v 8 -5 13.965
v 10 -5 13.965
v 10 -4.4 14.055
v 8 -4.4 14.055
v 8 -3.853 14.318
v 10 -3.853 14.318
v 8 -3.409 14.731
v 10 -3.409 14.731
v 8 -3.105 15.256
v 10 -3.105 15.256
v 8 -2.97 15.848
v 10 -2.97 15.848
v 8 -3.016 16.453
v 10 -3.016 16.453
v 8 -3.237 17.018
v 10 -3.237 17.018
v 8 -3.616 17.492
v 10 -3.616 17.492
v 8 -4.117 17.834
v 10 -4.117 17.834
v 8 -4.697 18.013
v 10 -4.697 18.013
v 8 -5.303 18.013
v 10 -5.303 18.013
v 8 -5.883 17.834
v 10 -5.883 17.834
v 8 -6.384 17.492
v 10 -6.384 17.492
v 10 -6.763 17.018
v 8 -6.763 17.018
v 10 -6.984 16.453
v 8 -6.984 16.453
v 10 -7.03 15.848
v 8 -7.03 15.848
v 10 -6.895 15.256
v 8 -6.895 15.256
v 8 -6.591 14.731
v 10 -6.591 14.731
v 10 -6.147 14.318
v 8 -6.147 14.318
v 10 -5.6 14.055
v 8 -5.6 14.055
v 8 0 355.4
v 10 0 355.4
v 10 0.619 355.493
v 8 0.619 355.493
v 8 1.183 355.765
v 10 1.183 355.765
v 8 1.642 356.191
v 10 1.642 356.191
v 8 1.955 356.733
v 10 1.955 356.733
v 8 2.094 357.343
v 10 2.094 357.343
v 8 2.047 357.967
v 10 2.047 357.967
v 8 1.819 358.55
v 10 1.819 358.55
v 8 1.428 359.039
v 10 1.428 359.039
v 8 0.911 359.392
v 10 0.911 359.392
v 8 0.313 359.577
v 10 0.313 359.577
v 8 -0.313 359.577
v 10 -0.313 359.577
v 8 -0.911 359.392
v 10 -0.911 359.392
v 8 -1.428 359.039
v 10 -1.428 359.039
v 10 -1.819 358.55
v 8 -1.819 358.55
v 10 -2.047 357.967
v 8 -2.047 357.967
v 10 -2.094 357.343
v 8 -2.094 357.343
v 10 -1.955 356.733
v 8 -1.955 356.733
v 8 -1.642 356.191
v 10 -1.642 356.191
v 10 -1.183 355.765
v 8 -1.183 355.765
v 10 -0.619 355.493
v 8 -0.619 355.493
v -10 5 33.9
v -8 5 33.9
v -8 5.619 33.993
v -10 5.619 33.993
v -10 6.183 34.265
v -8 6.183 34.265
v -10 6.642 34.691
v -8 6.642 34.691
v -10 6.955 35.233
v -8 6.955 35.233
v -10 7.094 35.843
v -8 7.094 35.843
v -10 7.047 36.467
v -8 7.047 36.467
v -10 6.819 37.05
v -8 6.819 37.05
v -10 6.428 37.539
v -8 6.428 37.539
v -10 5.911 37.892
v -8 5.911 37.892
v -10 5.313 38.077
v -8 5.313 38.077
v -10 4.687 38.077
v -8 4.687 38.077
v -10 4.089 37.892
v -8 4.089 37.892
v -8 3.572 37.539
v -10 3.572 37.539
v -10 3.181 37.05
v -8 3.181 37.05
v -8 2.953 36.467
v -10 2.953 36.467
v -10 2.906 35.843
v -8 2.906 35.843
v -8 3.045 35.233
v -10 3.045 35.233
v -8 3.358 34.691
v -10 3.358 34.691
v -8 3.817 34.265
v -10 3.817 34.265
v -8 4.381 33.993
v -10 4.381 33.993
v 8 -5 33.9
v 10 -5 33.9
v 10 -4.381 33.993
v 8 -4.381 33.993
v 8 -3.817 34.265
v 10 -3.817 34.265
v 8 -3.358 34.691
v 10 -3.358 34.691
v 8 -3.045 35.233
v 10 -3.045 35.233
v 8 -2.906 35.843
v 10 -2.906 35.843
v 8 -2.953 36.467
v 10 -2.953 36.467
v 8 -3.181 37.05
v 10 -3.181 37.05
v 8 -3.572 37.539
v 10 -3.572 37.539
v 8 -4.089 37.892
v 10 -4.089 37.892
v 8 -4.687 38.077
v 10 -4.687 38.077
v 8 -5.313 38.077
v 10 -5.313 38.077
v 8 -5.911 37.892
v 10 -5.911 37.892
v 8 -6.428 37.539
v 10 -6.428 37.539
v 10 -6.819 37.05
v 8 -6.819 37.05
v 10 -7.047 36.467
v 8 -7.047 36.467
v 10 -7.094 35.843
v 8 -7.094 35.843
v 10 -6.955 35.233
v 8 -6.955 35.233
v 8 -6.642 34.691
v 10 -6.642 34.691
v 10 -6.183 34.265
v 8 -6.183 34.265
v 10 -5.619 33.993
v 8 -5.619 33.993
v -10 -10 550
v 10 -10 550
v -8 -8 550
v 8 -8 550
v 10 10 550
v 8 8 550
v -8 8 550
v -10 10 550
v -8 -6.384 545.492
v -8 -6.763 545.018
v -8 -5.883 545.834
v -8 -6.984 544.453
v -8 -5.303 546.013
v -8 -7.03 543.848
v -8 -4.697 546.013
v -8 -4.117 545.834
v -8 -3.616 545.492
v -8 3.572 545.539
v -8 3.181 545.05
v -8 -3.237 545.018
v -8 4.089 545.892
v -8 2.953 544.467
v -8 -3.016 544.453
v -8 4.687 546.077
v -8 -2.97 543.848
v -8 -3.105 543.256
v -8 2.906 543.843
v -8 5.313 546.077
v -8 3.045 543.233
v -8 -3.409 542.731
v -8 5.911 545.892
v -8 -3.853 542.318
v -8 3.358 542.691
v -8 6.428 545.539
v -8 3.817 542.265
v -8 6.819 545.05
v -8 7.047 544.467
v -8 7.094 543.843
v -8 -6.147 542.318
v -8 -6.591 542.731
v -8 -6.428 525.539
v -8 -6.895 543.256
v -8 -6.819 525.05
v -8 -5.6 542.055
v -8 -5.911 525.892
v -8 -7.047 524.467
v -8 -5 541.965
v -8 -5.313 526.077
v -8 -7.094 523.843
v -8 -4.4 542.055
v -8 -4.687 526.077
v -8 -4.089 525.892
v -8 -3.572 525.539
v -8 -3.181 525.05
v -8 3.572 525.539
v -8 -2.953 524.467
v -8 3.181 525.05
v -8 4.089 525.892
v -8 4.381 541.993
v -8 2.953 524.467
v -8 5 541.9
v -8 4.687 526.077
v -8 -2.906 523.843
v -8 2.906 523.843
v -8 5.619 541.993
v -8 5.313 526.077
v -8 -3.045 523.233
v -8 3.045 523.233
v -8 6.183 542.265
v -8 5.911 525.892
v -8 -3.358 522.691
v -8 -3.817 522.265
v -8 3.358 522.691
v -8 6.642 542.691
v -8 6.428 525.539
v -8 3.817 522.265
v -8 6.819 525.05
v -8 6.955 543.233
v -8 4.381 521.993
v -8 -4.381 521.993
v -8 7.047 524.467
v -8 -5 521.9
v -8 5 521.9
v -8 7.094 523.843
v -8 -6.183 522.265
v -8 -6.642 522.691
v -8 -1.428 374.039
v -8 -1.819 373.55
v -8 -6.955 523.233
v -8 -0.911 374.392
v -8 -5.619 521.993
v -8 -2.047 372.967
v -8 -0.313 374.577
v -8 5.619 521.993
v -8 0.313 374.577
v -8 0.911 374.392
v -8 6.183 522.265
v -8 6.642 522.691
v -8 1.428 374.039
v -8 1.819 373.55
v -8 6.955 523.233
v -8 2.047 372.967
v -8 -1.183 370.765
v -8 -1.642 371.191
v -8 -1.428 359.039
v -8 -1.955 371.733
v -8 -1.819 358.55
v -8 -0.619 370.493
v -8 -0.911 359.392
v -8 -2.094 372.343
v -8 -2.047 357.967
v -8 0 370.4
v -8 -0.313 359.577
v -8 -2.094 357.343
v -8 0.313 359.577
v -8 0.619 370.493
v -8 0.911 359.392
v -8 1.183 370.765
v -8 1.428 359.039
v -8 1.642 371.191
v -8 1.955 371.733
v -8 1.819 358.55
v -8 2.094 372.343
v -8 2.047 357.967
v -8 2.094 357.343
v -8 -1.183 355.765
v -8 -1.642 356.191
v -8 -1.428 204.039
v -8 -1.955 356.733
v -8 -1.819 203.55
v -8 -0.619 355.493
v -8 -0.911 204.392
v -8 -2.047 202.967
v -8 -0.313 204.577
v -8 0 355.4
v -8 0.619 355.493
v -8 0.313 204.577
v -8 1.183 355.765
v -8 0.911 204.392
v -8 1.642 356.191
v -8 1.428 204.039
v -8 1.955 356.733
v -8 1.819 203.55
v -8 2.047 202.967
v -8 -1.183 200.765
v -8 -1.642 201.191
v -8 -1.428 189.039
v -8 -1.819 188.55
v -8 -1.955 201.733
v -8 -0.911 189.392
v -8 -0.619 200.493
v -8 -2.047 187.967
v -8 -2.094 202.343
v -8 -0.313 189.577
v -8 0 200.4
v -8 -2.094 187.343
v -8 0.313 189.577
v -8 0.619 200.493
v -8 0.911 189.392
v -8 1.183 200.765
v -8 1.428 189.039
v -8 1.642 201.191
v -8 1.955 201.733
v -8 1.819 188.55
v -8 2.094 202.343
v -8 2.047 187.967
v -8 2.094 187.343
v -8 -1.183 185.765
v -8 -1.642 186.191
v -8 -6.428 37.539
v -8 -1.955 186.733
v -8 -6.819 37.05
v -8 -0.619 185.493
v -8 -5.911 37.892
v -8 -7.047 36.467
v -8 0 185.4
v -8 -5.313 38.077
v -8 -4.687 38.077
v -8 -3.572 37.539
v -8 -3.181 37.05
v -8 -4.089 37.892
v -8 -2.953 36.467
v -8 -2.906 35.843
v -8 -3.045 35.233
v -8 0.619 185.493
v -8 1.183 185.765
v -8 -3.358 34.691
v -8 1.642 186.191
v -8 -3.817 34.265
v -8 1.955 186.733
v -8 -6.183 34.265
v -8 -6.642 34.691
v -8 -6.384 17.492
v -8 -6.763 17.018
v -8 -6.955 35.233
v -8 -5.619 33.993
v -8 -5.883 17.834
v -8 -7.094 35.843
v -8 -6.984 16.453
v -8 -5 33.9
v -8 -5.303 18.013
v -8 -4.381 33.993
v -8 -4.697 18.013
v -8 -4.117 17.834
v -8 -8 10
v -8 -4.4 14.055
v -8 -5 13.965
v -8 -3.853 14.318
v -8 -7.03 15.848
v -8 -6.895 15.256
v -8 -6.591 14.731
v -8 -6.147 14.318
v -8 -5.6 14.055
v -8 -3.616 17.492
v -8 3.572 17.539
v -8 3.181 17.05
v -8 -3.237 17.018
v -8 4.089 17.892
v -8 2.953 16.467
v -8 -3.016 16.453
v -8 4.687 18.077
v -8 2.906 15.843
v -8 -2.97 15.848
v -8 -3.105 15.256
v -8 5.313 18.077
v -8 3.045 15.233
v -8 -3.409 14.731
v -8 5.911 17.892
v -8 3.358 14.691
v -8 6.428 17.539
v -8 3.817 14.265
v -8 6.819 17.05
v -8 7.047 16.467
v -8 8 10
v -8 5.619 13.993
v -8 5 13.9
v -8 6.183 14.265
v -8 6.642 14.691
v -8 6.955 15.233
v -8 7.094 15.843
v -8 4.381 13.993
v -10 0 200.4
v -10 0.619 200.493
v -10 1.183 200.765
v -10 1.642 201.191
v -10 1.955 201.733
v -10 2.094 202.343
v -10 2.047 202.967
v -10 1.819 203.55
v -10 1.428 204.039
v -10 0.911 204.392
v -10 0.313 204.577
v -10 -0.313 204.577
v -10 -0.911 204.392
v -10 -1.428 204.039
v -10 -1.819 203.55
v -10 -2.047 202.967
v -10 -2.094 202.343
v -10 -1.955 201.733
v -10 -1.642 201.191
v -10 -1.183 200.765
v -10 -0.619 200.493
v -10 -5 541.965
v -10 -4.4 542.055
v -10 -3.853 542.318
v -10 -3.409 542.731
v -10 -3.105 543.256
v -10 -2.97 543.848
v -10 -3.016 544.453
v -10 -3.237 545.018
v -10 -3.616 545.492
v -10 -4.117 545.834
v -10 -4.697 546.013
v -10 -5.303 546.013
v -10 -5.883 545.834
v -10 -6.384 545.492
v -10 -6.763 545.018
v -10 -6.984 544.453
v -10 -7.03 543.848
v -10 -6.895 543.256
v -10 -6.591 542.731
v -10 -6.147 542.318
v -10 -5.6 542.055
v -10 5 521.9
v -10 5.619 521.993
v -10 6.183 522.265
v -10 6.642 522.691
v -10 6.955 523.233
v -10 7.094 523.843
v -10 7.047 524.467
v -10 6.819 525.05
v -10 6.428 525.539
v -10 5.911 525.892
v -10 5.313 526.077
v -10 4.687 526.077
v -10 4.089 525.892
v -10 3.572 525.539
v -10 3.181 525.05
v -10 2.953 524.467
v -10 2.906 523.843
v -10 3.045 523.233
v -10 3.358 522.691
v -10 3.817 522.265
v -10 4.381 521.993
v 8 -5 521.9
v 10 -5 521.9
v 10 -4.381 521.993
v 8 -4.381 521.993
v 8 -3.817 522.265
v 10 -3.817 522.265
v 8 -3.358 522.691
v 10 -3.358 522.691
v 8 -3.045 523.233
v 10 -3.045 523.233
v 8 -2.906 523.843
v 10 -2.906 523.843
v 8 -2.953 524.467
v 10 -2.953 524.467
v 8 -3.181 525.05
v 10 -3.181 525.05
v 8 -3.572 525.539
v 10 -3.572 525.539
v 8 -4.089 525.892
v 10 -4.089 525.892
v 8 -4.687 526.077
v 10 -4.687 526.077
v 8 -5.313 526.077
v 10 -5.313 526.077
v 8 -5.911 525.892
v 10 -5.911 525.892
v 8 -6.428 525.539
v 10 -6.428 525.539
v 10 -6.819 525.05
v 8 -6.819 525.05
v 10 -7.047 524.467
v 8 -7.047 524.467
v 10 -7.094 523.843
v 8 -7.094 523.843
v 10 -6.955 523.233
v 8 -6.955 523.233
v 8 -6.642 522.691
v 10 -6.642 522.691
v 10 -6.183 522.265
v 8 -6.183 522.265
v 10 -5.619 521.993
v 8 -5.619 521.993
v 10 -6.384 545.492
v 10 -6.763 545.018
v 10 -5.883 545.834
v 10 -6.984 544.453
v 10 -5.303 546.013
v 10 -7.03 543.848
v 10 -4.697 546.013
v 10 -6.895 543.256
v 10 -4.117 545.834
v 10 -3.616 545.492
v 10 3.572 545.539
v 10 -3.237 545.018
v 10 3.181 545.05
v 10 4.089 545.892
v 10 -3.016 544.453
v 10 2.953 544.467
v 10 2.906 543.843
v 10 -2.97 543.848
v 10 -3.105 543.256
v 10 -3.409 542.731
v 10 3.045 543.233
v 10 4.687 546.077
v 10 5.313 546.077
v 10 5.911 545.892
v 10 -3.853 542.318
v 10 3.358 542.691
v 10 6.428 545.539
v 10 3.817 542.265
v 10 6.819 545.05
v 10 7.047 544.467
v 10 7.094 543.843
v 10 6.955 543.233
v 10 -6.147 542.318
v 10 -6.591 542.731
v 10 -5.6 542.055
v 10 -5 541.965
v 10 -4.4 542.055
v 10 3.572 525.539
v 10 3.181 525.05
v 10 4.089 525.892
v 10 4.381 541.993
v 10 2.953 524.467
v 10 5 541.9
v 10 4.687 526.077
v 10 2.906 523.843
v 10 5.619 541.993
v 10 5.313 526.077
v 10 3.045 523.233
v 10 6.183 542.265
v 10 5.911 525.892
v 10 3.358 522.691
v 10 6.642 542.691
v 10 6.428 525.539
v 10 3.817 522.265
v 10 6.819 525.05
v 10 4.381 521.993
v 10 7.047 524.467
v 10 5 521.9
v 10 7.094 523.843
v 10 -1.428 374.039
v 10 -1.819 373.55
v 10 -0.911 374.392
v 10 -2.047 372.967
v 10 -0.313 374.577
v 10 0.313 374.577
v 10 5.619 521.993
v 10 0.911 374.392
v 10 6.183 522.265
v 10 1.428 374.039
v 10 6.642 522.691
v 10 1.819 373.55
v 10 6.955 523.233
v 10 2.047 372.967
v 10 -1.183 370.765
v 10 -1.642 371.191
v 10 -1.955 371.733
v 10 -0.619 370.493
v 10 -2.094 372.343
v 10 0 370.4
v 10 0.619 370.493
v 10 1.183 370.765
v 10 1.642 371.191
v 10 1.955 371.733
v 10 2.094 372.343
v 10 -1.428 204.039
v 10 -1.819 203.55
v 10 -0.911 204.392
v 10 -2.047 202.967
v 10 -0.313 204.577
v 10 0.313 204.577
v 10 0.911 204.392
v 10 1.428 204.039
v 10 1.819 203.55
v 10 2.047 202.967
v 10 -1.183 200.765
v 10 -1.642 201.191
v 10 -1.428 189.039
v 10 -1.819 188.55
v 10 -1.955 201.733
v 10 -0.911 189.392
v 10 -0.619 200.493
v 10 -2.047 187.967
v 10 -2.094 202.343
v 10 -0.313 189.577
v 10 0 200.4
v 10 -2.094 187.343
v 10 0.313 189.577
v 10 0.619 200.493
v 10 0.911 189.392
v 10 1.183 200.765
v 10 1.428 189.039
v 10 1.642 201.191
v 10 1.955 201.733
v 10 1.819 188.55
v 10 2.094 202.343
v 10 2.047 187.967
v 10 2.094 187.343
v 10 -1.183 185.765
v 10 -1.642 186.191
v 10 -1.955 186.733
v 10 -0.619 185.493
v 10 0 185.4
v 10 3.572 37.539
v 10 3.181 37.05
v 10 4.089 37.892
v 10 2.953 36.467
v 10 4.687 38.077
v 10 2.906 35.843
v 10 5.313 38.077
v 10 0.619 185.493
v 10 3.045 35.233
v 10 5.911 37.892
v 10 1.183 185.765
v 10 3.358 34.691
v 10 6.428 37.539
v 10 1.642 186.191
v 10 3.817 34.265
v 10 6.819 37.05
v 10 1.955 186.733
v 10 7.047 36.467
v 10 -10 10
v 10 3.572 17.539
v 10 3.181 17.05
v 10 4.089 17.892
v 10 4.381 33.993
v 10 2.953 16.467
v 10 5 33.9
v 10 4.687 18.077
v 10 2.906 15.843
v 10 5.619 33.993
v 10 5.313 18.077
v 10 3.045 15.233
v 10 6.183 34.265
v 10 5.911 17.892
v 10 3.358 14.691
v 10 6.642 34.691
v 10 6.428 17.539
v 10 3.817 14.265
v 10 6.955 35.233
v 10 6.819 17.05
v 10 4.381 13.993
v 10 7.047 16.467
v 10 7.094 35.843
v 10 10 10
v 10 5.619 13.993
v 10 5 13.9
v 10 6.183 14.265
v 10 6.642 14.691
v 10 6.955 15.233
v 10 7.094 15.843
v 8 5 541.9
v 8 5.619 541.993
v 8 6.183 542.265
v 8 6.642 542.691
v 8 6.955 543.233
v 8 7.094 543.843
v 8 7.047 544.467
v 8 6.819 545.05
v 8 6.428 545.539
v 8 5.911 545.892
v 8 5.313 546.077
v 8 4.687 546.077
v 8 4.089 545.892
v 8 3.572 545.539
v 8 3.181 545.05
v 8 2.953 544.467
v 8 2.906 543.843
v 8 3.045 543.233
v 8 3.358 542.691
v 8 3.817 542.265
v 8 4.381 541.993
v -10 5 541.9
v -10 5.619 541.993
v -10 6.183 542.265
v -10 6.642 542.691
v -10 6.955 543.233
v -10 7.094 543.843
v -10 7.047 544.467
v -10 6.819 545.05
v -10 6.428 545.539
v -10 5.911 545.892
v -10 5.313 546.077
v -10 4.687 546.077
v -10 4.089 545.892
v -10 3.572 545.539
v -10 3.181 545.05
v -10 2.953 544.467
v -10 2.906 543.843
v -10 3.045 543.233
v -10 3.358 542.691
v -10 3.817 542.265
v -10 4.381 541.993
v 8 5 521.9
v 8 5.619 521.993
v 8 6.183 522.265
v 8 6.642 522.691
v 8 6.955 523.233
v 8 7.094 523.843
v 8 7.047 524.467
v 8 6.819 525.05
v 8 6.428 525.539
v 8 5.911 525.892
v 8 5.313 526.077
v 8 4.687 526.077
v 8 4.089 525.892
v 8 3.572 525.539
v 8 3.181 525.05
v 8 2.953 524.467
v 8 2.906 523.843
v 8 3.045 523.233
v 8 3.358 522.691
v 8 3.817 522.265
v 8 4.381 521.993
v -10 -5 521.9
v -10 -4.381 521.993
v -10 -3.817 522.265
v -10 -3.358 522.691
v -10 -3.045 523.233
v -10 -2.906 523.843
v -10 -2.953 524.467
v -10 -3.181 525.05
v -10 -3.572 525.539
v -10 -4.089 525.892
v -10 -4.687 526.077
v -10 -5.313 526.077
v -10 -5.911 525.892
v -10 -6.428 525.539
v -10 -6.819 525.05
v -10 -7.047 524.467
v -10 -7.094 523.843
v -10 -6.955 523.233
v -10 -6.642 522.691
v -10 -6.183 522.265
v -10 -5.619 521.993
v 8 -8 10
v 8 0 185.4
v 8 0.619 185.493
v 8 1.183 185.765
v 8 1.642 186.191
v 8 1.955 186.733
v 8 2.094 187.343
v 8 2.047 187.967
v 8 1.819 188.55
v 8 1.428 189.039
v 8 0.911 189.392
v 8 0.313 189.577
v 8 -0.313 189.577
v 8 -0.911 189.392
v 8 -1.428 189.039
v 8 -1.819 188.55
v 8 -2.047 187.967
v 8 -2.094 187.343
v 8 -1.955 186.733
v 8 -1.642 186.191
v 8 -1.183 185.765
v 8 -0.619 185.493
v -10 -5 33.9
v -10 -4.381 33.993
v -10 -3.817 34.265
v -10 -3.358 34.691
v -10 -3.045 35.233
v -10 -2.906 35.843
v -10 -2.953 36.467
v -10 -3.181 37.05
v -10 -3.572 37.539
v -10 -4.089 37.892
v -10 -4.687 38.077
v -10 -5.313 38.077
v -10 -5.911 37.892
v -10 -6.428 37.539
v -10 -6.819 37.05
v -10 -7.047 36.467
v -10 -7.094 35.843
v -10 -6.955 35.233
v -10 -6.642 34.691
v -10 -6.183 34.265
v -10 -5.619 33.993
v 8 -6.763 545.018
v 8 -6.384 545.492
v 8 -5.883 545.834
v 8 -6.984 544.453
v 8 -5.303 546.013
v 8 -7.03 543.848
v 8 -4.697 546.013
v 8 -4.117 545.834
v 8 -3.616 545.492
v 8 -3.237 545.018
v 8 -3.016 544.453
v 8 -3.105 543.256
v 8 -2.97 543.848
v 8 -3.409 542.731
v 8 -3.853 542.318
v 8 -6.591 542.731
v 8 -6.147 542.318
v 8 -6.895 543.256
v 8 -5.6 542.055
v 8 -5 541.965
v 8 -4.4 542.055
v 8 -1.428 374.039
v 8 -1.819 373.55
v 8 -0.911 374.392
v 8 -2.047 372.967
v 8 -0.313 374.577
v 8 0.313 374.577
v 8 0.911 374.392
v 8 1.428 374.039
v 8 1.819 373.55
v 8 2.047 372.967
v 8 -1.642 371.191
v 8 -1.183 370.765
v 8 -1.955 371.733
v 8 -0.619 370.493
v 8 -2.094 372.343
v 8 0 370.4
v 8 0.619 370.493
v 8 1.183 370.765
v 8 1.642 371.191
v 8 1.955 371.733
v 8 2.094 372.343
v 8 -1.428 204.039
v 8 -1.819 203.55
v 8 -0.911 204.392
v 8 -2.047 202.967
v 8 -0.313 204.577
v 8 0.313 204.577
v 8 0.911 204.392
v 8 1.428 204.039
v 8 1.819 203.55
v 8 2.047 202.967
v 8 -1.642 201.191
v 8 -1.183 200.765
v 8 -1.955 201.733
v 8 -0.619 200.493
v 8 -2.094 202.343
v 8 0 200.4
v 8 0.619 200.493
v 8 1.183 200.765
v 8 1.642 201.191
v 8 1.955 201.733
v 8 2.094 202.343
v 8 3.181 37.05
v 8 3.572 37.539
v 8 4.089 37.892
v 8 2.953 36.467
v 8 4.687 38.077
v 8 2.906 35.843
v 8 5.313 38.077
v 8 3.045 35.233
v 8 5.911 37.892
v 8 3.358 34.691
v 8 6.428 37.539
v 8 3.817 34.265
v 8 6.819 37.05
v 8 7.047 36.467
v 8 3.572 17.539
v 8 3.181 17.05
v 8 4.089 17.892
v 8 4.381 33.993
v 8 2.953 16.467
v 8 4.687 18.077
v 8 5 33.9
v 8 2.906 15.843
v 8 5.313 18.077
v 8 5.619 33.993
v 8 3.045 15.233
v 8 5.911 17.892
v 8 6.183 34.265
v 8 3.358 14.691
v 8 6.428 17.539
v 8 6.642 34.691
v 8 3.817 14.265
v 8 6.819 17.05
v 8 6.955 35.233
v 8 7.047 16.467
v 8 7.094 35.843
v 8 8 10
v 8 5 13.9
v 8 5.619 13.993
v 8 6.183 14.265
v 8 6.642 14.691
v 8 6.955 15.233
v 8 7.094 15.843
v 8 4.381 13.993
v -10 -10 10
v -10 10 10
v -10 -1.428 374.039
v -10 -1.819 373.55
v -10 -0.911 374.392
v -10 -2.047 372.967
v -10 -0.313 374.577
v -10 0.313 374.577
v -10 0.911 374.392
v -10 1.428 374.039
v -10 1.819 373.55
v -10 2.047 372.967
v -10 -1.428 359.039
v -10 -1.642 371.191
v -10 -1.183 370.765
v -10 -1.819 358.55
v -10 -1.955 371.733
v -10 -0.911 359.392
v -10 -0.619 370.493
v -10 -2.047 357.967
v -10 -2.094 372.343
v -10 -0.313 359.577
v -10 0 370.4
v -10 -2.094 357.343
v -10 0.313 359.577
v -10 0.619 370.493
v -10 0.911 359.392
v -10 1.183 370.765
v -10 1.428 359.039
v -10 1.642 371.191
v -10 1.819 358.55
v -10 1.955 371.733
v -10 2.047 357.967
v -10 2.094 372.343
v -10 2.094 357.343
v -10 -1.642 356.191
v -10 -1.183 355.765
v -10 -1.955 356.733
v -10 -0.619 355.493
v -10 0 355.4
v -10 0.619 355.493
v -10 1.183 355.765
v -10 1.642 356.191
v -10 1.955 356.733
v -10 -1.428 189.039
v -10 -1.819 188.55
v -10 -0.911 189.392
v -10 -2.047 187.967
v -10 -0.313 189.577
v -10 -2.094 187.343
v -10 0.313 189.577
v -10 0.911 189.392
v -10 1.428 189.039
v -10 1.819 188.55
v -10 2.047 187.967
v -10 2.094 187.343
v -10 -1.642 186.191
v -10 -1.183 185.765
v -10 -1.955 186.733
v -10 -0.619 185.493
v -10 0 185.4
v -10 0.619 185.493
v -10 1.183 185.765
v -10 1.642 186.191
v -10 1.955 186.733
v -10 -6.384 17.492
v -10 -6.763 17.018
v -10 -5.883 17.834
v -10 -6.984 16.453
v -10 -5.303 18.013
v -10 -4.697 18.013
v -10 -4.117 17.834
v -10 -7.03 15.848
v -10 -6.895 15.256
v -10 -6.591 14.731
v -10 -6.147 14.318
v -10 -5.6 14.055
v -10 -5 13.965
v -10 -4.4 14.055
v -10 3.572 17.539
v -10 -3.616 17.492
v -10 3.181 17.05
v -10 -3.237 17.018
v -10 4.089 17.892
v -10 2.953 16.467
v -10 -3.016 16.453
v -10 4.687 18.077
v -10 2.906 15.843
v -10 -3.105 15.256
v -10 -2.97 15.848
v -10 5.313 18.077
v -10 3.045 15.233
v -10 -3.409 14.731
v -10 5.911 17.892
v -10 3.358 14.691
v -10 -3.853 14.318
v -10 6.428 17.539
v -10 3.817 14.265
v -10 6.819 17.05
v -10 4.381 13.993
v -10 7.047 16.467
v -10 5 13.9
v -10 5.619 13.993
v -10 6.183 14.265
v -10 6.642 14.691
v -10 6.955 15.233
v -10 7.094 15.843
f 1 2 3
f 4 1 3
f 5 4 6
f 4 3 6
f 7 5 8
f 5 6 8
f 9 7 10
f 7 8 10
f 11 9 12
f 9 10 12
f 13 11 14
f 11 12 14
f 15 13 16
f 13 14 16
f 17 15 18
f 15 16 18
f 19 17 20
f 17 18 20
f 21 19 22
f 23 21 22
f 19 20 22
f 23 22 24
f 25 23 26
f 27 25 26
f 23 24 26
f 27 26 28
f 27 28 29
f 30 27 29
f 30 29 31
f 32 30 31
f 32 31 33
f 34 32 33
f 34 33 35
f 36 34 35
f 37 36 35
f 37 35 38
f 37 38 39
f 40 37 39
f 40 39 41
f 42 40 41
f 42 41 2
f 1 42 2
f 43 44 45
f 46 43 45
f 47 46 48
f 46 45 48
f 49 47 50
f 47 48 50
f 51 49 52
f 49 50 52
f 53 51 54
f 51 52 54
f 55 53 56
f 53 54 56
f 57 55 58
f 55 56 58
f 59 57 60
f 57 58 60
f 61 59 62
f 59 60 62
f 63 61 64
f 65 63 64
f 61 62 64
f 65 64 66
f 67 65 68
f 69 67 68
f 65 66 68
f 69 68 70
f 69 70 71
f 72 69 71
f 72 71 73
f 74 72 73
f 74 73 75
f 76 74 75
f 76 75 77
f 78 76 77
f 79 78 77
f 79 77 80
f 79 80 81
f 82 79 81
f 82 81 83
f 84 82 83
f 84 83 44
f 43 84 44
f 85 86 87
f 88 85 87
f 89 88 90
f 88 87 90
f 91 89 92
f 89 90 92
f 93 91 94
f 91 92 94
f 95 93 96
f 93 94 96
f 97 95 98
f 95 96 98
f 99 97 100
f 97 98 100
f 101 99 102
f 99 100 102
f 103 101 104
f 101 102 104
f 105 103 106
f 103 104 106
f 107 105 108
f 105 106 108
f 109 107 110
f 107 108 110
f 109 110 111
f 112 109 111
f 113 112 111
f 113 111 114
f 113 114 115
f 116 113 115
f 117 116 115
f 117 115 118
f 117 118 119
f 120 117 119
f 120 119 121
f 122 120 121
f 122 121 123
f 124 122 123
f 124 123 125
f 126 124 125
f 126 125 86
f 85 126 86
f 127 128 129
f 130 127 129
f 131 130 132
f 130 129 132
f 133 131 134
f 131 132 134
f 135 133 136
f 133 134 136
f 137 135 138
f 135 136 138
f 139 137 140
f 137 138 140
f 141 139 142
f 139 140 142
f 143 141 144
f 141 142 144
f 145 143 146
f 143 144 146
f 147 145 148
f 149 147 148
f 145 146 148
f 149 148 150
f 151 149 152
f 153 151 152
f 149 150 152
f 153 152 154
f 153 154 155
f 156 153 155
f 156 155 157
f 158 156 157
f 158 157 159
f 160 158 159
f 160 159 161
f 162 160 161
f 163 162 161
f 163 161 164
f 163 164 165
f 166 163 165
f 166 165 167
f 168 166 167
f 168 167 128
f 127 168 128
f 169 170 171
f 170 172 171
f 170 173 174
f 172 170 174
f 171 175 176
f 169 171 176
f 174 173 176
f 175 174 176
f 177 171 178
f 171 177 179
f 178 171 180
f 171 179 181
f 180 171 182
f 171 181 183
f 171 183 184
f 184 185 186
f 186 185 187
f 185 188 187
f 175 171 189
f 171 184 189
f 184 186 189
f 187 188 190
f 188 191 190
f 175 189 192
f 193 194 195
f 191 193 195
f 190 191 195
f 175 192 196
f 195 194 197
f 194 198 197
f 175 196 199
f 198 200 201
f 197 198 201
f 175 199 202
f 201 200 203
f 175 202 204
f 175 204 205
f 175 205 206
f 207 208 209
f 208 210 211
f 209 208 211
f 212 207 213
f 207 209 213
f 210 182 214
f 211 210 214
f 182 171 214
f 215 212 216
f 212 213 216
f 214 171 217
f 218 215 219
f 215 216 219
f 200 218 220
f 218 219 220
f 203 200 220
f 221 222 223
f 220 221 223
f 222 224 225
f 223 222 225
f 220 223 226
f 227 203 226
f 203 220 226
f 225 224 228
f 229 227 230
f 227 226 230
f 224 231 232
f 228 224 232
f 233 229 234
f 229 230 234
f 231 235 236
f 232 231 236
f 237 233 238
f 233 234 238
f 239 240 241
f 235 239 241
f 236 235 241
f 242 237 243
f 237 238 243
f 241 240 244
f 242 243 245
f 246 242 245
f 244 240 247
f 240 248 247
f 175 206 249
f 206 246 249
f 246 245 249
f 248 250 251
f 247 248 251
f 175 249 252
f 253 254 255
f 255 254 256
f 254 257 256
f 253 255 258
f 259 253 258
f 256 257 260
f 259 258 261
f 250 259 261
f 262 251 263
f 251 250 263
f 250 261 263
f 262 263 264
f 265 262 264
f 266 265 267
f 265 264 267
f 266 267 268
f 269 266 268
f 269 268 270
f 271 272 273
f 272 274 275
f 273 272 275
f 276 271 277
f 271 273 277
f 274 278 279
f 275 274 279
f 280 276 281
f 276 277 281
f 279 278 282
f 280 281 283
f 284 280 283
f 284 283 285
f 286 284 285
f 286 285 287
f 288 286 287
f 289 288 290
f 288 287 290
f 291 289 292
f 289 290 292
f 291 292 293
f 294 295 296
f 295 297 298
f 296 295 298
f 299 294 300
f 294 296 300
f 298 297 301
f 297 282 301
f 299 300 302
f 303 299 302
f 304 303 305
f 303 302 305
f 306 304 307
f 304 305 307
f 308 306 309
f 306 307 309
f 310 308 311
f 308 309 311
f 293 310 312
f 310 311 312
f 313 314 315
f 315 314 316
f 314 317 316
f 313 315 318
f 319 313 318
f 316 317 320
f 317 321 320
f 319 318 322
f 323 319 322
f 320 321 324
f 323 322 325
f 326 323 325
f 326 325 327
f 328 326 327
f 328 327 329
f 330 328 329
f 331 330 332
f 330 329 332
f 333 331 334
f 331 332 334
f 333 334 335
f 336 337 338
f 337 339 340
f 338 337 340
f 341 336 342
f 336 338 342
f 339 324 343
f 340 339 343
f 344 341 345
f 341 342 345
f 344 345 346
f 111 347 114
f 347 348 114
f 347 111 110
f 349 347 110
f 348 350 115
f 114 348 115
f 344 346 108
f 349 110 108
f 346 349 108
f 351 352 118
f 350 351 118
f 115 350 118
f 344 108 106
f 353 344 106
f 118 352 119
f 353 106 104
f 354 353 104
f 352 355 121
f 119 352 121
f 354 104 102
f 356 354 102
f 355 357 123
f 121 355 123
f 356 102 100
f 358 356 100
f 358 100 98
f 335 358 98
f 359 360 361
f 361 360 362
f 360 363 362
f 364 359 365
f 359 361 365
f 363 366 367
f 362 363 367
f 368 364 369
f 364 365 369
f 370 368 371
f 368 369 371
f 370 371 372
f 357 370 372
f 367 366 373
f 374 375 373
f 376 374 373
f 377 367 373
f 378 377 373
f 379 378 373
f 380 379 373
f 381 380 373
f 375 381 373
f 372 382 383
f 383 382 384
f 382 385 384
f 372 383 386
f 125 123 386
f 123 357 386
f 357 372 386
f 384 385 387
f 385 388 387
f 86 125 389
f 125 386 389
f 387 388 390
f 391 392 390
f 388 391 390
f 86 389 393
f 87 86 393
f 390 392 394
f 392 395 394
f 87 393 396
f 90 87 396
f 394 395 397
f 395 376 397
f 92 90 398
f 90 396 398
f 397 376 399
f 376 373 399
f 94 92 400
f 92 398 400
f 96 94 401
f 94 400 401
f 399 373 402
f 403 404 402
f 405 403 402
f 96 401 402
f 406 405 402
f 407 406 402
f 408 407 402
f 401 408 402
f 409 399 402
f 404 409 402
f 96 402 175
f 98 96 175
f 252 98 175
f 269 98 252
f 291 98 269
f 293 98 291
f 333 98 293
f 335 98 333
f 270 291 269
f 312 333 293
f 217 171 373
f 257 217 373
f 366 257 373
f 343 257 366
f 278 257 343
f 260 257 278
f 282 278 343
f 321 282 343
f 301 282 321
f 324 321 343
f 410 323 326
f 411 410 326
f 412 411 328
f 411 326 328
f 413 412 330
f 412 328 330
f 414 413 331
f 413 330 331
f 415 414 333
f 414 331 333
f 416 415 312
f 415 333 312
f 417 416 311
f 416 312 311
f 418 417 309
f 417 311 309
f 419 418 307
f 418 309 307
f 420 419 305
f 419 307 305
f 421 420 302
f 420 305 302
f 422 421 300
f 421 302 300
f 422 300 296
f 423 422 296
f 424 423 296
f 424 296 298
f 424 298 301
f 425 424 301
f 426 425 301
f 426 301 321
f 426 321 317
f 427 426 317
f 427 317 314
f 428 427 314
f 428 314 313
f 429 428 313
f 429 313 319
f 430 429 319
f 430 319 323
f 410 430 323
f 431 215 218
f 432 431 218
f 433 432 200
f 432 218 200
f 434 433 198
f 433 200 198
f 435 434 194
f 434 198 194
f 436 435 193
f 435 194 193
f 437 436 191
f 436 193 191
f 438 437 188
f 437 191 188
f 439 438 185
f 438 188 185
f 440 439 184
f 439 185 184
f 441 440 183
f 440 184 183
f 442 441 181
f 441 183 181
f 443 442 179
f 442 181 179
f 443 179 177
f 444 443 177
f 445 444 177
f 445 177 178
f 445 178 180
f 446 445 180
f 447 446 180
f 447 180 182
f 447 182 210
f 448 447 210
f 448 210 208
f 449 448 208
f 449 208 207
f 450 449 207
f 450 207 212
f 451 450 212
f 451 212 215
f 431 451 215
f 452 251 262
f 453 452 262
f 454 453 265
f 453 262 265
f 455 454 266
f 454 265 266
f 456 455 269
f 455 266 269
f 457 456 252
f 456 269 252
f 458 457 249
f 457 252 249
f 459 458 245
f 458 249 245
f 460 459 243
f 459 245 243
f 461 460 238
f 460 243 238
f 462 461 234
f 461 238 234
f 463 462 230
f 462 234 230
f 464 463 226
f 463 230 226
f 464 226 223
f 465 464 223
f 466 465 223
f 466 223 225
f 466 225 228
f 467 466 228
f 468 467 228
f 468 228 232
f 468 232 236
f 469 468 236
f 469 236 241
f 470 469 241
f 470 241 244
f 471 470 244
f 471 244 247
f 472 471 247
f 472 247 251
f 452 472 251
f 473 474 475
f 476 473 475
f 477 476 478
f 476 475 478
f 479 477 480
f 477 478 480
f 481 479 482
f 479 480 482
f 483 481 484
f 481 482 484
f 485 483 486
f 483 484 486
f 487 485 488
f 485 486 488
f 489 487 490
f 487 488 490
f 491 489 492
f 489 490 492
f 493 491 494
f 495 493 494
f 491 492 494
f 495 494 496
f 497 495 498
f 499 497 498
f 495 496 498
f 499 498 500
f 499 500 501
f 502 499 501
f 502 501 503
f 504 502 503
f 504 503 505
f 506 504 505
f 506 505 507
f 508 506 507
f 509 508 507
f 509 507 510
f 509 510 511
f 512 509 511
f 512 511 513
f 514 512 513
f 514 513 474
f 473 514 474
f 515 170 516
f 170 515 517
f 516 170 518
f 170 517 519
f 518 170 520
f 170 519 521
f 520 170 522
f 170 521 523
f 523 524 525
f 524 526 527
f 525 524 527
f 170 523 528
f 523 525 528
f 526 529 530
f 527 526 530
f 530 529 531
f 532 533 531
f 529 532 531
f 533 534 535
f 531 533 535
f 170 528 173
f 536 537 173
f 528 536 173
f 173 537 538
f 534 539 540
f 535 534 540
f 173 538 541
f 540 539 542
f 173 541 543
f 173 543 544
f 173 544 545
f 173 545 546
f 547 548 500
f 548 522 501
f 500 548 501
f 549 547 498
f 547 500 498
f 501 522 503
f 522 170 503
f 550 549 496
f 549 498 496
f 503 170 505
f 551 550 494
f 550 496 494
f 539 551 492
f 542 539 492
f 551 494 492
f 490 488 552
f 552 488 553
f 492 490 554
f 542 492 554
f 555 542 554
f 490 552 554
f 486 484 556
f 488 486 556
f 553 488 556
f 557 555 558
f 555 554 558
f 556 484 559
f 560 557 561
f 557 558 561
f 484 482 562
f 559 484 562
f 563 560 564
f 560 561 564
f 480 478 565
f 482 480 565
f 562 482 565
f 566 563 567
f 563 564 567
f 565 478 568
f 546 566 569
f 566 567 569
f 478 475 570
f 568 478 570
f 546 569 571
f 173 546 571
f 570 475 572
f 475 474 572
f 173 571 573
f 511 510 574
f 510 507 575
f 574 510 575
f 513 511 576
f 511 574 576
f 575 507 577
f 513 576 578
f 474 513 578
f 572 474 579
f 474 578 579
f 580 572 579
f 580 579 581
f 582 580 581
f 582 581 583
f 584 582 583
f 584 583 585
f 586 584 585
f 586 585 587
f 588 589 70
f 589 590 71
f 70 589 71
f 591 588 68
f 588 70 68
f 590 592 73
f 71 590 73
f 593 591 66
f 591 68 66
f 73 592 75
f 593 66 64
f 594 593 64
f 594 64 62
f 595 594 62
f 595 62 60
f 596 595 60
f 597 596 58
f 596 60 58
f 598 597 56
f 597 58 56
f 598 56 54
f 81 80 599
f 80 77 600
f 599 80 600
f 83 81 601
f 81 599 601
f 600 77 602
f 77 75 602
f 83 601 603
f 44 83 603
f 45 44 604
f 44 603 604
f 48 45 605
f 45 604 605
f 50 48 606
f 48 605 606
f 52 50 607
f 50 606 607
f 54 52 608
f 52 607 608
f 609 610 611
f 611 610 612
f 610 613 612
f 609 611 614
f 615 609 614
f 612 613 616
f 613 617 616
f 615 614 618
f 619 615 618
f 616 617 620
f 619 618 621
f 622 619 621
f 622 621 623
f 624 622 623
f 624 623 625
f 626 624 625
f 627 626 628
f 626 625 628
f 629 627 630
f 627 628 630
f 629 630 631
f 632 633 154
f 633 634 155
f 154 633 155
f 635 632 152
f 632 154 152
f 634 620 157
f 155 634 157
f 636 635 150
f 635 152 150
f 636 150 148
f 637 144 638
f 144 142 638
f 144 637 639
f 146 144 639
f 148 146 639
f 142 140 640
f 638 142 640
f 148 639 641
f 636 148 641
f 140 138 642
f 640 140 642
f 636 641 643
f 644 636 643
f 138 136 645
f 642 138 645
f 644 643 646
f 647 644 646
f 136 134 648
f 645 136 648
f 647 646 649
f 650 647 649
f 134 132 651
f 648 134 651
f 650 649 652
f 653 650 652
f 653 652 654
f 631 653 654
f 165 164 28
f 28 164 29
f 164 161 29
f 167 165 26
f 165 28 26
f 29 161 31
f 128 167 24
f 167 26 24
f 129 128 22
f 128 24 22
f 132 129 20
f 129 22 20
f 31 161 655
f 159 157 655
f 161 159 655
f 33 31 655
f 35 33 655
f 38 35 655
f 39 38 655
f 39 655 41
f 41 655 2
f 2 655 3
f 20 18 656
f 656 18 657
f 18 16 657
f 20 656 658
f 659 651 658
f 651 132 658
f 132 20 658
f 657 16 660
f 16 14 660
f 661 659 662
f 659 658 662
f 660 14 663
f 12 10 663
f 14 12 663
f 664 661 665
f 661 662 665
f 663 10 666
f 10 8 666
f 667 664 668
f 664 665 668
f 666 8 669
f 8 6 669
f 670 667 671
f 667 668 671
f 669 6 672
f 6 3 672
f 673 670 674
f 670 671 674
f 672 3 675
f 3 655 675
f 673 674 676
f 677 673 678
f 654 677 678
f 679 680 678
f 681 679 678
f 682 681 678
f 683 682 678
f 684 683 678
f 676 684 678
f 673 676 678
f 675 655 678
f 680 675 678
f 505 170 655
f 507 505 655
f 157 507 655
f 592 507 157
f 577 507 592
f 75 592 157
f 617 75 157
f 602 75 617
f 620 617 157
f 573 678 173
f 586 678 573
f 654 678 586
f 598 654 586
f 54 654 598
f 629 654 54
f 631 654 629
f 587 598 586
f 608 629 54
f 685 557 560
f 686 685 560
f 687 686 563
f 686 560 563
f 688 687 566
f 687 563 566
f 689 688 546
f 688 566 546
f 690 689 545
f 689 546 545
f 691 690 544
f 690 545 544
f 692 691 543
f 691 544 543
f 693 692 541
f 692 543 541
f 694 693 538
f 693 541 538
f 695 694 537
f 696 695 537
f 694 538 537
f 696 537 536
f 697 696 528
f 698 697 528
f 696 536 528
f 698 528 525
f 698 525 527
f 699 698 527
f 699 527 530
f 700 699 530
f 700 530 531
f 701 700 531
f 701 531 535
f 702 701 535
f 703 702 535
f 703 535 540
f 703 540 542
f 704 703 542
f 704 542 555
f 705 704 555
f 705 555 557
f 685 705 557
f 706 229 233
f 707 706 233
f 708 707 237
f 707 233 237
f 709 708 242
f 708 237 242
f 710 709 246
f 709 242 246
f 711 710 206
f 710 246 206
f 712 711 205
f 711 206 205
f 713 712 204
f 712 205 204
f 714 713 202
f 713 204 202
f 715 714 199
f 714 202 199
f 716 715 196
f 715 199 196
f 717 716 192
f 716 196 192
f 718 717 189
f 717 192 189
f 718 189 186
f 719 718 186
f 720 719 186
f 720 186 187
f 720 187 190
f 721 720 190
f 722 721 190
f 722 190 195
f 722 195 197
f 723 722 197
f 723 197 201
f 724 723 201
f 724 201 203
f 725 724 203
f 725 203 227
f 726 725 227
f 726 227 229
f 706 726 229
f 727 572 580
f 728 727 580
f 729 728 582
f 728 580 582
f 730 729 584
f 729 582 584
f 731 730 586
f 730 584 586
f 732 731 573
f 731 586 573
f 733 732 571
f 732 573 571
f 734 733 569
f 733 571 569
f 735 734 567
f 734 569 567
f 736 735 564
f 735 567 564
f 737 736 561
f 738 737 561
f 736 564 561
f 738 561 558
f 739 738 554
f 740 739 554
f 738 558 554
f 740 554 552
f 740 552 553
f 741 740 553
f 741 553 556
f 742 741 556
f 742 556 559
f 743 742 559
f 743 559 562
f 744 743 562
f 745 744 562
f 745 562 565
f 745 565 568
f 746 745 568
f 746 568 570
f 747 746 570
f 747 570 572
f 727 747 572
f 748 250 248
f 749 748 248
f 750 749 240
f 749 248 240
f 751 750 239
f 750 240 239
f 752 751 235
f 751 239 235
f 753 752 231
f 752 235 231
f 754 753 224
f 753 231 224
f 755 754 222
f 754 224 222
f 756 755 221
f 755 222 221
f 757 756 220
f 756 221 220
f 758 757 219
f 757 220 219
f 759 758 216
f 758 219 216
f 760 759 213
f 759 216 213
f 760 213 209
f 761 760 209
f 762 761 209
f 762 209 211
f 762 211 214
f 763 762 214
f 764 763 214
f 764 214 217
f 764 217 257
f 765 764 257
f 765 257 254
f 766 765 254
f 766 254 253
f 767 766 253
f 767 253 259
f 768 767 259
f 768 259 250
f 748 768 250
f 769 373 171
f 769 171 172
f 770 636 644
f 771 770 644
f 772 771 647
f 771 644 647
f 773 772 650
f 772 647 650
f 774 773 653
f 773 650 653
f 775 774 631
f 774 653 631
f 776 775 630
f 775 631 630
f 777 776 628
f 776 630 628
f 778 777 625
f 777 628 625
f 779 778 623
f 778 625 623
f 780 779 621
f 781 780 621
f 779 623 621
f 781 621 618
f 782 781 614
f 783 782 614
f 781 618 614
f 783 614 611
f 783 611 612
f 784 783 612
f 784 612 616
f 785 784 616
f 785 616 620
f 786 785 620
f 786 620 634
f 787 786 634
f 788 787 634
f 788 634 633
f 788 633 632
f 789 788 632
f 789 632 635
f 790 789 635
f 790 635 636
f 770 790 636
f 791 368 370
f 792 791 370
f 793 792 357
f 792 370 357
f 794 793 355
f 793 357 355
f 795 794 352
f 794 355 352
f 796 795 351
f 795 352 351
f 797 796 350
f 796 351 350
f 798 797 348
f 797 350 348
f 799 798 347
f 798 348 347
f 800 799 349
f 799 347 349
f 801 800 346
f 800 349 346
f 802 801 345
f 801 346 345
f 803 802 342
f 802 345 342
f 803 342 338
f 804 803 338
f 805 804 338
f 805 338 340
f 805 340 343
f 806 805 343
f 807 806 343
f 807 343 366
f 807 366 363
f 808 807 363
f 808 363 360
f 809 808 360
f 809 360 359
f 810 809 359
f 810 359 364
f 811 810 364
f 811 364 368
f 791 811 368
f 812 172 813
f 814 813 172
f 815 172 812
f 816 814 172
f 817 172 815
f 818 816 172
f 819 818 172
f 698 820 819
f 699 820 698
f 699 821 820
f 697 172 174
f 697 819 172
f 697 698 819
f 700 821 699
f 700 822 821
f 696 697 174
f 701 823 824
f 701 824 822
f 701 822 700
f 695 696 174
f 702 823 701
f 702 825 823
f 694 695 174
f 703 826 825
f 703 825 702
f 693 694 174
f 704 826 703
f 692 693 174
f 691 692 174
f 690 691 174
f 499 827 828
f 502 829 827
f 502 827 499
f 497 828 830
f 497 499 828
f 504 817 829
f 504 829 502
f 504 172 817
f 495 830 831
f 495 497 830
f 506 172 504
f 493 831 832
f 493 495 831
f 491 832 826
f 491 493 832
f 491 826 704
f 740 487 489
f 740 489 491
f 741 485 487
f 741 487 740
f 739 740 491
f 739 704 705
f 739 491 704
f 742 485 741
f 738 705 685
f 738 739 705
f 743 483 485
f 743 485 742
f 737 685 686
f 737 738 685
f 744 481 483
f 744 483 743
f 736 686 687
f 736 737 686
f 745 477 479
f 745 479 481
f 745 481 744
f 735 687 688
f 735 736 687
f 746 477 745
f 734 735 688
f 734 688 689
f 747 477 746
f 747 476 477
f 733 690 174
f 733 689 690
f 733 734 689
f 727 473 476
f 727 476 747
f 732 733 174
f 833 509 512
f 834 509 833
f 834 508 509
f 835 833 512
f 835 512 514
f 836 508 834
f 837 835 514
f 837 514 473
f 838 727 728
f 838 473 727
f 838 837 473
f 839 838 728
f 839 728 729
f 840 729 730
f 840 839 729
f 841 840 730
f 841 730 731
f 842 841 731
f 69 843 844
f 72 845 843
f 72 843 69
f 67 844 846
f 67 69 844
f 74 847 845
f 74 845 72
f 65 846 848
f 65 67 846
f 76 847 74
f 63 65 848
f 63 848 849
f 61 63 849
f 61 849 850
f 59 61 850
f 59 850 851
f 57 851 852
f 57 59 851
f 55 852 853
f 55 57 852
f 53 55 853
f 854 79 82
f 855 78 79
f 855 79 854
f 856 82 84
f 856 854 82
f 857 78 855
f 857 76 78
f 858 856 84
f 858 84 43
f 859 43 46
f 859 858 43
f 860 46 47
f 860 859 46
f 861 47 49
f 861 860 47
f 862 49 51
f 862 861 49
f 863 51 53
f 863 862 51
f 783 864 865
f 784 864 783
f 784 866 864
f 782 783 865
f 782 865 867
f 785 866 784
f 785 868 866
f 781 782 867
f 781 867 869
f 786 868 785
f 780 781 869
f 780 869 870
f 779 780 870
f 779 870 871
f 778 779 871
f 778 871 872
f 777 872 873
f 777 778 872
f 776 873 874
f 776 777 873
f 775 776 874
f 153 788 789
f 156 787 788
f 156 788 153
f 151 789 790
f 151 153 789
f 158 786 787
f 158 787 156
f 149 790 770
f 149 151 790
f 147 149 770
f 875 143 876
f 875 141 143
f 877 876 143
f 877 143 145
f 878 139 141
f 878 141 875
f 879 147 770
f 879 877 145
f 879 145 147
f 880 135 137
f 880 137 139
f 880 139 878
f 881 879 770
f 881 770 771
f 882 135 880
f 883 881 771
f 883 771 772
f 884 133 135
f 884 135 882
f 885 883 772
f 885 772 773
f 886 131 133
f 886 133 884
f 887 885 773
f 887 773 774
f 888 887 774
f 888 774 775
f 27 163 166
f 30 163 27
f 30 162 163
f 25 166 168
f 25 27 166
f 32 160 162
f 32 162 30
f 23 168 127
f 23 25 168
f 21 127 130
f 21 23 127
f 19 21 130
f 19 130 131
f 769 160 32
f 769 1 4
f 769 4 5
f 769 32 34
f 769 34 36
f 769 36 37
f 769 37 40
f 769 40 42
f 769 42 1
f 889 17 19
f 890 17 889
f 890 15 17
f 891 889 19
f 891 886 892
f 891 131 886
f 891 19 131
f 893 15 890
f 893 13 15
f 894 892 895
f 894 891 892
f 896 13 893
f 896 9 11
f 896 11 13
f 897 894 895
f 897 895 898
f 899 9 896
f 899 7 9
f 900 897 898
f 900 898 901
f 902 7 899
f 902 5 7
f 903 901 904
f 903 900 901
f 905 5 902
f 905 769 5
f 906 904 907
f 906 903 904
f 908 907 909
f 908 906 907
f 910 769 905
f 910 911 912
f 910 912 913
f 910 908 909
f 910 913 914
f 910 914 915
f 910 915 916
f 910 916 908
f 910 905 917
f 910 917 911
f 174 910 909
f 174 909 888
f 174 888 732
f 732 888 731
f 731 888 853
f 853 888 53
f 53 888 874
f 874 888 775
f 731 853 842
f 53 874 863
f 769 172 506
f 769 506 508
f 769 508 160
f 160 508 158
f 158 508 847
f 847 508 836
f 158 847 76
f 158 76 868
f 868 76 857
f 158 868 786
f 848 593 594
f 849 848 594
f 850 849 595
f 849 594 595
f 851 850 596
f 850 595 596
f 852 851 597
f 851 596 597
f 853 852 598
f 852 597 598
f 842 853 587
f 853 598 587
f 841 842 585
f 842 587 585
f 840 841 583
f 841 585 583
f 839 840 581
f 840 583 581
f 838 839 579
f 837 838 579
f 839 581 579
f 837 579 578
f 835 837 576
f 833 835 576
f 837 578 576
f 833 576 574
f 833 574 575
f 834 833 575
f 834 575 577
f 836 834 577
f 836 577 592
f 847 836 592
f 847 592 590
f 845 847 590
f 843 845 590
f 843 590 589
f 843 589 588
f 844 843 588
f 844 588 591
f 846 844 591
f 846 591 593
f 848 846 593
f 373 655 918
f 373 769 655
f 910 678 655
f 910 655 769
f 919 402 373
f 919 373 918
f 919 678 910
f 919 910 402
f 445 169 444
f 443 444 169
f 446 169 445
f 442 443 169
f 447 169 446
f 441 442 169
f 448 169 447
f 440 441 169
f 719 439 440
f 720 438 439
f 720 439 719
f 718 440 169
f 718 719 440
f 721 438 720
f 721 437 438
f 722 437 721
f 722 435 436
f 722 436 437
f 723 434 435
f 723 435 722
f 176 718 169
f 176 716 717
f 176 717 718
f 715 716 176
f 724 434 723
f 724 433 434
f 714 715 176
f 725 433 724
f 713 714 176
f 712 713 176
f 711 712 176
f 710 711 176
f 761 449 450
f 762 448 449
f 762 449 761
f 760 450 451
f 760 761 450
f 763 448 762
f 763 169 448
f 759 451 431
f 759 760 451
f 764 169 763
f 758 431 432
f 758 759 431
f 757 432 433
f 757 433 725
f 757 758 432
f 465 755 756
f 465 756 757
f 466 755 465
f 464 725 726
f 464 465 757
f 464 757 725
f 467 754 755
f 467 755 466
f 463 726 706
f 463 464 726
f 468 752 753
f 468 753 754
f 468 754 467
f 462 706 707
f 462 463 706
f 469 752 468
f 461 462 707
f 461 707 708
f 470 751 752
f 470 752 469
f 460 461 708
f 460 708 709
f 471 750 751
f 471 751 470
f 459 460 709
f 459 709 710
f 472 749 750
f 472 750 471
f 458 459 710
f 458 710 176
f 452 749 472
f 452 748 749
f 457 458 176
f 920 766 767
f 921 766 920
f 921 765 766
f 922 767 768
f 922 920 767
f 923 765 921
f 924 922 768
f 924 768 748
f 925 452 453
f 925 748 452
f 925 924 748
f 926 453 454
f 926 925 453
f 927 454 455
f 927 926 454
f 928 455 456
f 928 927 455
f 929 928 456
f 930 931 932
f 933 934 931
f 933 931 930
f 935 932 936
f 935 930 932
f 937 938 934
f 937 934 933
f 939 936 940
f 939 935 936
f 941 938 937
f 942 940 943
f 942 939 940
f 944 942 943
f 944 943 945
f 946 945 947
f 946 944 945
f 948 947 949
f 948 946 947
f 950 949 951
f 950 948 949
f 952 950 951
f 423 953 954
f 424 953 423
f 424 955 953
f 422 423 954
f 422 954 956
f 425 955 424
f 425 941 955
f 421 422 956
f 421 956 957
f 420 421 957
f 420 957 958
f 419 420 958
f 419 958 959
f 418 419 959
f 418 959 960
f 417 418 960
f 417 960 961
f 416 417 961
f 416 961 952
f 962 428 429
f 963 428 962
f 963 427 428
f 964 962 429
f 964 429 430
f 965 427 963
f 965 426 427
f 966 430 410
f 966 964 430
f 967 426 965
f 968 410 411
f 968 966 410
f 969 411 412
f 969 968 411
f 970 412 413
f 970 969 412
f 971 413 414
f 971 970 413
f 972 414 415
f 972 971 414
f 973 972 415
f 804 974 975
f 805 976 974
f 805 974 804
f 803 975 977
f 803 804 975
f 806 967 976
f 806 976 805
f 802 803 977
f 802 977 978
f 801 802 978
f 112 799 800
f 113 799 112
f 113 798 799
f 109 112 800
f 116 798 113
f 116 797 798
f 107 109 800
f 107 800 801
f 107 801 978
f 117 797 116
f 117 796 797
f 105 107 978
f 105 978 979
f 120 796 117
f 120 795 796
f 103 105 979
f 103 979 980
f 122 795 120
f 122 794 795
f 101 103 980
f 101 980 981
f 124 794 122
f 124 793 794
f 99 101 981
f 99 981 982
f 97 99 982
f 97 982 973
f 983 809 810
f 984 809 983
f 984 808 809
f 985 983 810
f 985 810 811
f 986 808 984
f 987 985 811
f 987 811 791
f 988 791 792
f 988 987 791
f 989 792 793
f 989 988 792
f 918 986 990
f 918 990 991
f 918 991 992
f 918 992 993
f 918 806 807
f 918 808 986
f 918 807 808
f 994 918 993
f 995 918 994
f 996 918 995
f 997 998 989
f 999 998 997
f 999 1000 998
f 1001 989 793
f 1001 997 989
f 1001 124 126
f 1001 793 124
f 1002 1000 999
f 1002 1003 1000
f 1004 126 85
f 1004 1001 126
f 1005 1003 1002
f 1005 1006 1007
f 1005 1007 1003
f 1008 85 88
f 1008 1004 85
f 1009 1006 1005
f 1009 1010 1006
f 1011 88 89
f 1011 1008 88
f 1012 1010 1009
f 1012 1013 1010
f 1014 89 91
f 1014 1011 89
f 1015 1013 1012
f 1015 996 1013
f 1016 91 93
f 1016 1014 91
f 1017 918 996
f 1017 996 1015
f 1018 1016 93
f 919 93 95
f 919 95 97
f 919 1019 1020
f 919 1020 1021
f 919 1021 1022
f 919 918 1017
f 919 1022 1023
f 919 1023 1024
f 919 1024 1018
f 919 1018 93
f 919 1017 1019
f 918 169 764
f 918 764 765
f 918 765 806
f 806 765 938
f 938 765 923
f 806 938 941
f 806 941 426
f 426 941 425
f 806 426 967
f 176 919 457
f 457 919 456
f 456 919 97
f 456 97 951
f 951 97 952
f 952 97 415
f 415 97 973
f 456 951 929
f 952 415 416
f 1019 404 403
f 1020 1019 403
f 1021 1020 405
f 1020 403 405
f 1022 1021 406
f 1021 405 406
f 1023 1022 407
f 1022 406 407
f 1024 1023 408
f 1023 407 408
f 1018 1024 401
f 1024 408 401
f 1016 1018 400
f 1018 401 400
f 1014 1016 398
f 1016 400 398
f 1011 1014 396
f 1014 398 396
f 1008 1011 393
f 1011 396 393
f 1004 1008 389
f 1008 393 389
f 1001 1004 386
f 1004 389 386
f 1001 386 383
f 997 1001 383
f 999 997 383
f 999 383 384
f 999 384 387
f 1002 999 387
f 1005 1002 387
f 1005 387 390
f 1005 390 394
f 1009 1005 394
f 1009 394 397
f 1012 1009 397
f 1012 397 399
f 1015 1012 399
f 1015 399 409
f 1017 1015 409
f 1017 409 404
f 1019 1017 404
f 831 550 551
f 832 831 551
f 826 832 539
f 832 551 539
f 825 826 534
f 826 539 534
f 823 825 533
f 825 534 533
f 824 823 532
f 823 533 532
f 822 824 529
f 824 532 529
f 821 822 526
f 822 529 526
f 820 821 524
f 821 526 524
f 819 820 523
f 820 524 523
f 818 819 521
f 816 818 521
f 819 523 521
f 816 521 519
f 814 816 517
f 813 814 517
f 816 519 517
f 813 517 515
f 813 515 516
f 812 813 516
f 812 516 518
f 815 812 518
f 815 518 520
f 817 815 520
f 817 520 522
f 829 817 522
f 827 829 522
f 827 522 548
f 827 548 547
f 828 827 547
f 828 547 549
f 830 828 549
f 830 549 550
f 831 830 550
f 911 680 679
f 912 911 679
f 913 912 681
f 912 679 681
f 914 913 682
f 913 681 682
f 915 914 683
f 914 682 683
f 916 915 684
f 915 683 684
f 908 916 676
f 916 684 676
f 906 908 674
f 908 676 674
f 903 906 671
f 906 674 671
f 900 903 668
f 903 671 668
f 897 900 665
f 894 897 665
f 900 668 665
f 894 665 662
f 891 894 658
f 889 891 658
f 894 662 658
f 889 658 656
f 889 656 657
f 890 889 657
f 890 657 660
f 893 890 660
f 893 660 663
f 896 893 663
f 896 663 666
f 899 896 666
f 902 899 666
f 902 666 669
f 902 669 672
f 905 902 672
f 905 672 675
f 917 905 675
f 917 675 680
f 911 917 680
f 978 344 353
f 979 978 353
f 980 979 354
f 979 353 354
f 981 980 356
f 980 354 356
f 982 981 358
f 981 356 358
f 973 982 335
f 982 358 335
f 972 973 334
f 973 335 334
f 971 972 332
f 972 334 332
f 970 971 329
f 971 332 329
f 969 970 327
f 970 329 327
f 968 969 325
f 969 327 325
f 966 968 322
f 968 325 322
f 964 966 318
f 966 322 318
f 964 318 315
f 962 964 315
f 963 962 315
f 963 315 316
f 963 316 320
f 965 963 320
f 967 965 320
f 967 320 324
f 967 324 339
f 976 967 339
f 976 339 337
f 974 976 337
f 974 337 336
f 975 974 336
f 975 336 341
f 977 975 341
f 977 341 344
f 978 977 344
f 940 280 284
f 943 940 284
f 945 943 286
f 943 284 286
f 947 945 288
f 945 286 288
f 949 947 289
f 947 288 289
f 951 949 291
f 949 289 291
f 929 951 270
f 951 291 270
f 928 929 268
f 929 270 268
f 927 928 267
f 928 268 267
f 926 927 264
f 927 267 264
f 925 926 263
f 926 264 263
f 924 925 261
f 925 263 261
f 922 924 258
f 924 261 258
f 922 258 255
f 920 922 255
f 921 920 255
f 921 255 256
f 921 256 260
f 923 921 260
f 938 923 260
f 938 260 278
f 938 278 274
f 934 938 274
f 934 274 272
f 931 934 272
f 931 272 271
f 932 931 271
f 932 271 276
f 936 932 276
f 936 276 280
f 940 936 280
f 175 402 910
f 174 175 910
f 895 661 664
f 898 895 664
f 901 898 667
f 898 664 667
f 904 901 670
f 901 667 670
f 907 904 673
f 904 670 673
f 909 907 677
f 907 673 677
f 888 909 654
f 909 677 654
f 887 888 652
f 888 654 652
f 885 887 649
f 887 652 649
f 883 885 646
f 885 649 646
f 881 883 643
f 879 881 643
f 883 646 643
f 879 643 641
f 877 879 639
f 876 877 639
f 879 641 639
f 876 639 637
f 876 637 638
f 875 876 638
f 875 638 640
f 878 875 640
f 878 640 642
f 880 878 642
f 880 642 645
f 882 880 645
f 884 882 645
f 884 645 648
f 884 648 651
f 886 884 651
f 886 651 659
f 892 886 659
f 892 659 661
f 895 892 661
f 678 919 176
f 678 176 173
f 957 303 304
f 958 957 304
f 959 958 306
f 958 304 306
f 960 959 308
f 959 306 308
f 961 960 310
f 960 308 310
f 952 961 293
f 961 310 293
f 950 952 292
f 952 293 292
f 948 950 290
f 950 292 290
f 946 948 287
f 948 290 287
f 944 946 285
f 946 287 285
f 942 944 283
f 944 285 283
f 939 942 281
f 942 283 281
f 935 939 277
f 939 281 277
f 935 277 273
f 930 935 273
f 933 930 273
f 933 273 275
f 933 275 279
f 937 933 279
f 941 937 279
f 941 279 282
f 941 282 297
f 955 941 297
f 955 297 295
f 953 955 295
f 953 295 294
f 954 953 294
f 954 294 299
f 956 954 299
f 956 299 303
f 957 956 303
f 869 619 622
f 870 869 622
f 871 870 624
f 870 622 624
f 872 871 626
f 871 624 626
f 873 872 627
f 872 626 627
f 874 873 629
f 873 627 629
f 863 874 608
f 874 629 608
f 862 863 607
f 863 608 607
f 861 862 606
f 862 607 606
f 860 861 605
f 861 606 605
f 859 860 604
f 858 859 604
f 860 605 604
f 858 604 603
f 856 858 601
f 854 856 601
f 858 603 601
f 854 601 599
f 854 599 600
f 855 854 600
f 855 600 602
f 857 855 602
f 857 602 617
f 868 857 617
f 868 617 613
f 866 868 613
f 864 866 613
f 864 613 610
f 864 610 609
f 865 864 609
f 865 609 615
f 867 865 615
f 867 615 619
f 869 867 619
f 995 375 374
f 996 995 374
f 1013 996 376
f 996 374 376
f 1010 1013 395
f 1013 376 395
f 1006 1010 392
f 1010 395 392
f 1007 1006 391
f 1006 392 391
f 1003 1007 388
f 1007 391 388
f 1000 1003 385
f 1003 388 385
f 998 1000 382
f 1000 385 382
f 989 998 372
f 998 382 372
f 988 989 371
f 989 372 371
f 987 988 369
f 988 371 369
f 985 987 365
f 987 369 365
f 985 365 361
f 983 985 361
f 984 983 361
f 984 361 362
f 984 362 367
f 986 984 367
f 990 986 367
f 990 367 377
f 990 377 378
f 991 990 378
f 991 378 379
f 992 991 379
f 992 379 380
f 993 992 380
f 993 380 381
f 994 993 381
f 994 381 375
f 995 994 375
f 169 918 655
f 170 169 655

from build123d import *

# Parameters (mm, degrees)
SKETCH_1_W          = 20
SKETCH_1_H          = 20
SKETCH_1_W_2        = 16
SKETCH_1_H_2        = 16
EXTRUDE_1_DEPTH     = 560
SKETCH_2_W          = 20
SKETCH_2_H          = 20
CUT_EXTRUDE_1_DEPTH = 10
SKETCH_3_R          = 2.1
SKETCH_3_R_2        = 2.035272785
CUT_EXTRUDE_2_DEPTH = 551.454357781
SKETCH_4_R          = 2.1
CUT_EXTRUDE_3_DEPTH = 551.454357781


with BuildPart() as part:
    # 草图1 → 凸台-拉伸1 (new body)
    with BuildSketch(Plane.XY):
        Rectangle(SKETCH_1_W, SKETCH_1_H)
        Rectangle(SKETCH_1_W_2, SKETCH_1_H_2, mode=Mode.SUBTRACT)
    extrude(amount=EXTRUDE_1_DEPTH)

    # 草图2 → 切除-拉伸1 (cut)
    with BuildSketch(Plane(origin=(0, 0, 0), x_dir=(-1, 0, 0), z_dir=(0, 0, -1))):
        Rectangle(SKETCH_2_W, SKETCH_2_H)
    cut_extrude_1 = extrude(amount=-CUT_EXTRUDE_1_DEPTH, mode=Mode.SUBTRACT)

    # 镜向1: 切除-拉伸1 across plane
    add(cut_extrude_1.mirror(Plane(origin=(-40, 280, 280), x_dir=(1, 0, 0), z_dir=(0, 0, 1))), mode=Mode.SUBTRACT)

    # 草图3 → 切除-拉伸2 (cut, through all)
    with BuildSketch(Plane(origin=(10, 0, 0), x_dir=(0, 0, -1), z_dir=(1, 0, 0))):
        with Locations((-16, 5)):
            Circle(SKETCH_3_R)
        with Locations((-16, -5)):
            Circle(SKETCH_3_R_2)
        with Locations((-36, 5)):
            Circle(SKETCH_3_R)
        with Locations((-36, -5)):
            Circle(SKETCH_3_R)
        with Locations((-544, 5)):
            Circle(SKETCH_3_R)
        with Locations((-544, -5)):
            Circle(SKETCH_3_R_2)
        with Locations((-524, -5)):
            Circle(SKETCH_3_R)
        with Locations((-524, 5)):
            Circle(SKETCH_3_R)
    extrude(amount=-CUT_EXTRUDE_2_DEPTH, mode=Mode.SUBTRACT)

    # 草图4 → 切除-拉伸3 (cut, through all)
    with BuildSketch(Plane(origin=(10, 0, 0), x_dir=(0, 0, -1), z_dir=(1, 0, 0))):
        with Locations((-187.5, 0)):
            Circle(SKETCH_4_R)
        with Locations((-202.5, 0)):
            Circle(SKETCH_4_R)
        with Locations((-357.5, 0)):
            Circle(SKETCH_4_R)
        with Locations((-372.5, 0)):
            Circle(SKETCH_4_R)
    extrude(amount=-CUT_EXTRUDE_3_DEPTH, mode=Mode.SUBTRACT)


solid = part.part
